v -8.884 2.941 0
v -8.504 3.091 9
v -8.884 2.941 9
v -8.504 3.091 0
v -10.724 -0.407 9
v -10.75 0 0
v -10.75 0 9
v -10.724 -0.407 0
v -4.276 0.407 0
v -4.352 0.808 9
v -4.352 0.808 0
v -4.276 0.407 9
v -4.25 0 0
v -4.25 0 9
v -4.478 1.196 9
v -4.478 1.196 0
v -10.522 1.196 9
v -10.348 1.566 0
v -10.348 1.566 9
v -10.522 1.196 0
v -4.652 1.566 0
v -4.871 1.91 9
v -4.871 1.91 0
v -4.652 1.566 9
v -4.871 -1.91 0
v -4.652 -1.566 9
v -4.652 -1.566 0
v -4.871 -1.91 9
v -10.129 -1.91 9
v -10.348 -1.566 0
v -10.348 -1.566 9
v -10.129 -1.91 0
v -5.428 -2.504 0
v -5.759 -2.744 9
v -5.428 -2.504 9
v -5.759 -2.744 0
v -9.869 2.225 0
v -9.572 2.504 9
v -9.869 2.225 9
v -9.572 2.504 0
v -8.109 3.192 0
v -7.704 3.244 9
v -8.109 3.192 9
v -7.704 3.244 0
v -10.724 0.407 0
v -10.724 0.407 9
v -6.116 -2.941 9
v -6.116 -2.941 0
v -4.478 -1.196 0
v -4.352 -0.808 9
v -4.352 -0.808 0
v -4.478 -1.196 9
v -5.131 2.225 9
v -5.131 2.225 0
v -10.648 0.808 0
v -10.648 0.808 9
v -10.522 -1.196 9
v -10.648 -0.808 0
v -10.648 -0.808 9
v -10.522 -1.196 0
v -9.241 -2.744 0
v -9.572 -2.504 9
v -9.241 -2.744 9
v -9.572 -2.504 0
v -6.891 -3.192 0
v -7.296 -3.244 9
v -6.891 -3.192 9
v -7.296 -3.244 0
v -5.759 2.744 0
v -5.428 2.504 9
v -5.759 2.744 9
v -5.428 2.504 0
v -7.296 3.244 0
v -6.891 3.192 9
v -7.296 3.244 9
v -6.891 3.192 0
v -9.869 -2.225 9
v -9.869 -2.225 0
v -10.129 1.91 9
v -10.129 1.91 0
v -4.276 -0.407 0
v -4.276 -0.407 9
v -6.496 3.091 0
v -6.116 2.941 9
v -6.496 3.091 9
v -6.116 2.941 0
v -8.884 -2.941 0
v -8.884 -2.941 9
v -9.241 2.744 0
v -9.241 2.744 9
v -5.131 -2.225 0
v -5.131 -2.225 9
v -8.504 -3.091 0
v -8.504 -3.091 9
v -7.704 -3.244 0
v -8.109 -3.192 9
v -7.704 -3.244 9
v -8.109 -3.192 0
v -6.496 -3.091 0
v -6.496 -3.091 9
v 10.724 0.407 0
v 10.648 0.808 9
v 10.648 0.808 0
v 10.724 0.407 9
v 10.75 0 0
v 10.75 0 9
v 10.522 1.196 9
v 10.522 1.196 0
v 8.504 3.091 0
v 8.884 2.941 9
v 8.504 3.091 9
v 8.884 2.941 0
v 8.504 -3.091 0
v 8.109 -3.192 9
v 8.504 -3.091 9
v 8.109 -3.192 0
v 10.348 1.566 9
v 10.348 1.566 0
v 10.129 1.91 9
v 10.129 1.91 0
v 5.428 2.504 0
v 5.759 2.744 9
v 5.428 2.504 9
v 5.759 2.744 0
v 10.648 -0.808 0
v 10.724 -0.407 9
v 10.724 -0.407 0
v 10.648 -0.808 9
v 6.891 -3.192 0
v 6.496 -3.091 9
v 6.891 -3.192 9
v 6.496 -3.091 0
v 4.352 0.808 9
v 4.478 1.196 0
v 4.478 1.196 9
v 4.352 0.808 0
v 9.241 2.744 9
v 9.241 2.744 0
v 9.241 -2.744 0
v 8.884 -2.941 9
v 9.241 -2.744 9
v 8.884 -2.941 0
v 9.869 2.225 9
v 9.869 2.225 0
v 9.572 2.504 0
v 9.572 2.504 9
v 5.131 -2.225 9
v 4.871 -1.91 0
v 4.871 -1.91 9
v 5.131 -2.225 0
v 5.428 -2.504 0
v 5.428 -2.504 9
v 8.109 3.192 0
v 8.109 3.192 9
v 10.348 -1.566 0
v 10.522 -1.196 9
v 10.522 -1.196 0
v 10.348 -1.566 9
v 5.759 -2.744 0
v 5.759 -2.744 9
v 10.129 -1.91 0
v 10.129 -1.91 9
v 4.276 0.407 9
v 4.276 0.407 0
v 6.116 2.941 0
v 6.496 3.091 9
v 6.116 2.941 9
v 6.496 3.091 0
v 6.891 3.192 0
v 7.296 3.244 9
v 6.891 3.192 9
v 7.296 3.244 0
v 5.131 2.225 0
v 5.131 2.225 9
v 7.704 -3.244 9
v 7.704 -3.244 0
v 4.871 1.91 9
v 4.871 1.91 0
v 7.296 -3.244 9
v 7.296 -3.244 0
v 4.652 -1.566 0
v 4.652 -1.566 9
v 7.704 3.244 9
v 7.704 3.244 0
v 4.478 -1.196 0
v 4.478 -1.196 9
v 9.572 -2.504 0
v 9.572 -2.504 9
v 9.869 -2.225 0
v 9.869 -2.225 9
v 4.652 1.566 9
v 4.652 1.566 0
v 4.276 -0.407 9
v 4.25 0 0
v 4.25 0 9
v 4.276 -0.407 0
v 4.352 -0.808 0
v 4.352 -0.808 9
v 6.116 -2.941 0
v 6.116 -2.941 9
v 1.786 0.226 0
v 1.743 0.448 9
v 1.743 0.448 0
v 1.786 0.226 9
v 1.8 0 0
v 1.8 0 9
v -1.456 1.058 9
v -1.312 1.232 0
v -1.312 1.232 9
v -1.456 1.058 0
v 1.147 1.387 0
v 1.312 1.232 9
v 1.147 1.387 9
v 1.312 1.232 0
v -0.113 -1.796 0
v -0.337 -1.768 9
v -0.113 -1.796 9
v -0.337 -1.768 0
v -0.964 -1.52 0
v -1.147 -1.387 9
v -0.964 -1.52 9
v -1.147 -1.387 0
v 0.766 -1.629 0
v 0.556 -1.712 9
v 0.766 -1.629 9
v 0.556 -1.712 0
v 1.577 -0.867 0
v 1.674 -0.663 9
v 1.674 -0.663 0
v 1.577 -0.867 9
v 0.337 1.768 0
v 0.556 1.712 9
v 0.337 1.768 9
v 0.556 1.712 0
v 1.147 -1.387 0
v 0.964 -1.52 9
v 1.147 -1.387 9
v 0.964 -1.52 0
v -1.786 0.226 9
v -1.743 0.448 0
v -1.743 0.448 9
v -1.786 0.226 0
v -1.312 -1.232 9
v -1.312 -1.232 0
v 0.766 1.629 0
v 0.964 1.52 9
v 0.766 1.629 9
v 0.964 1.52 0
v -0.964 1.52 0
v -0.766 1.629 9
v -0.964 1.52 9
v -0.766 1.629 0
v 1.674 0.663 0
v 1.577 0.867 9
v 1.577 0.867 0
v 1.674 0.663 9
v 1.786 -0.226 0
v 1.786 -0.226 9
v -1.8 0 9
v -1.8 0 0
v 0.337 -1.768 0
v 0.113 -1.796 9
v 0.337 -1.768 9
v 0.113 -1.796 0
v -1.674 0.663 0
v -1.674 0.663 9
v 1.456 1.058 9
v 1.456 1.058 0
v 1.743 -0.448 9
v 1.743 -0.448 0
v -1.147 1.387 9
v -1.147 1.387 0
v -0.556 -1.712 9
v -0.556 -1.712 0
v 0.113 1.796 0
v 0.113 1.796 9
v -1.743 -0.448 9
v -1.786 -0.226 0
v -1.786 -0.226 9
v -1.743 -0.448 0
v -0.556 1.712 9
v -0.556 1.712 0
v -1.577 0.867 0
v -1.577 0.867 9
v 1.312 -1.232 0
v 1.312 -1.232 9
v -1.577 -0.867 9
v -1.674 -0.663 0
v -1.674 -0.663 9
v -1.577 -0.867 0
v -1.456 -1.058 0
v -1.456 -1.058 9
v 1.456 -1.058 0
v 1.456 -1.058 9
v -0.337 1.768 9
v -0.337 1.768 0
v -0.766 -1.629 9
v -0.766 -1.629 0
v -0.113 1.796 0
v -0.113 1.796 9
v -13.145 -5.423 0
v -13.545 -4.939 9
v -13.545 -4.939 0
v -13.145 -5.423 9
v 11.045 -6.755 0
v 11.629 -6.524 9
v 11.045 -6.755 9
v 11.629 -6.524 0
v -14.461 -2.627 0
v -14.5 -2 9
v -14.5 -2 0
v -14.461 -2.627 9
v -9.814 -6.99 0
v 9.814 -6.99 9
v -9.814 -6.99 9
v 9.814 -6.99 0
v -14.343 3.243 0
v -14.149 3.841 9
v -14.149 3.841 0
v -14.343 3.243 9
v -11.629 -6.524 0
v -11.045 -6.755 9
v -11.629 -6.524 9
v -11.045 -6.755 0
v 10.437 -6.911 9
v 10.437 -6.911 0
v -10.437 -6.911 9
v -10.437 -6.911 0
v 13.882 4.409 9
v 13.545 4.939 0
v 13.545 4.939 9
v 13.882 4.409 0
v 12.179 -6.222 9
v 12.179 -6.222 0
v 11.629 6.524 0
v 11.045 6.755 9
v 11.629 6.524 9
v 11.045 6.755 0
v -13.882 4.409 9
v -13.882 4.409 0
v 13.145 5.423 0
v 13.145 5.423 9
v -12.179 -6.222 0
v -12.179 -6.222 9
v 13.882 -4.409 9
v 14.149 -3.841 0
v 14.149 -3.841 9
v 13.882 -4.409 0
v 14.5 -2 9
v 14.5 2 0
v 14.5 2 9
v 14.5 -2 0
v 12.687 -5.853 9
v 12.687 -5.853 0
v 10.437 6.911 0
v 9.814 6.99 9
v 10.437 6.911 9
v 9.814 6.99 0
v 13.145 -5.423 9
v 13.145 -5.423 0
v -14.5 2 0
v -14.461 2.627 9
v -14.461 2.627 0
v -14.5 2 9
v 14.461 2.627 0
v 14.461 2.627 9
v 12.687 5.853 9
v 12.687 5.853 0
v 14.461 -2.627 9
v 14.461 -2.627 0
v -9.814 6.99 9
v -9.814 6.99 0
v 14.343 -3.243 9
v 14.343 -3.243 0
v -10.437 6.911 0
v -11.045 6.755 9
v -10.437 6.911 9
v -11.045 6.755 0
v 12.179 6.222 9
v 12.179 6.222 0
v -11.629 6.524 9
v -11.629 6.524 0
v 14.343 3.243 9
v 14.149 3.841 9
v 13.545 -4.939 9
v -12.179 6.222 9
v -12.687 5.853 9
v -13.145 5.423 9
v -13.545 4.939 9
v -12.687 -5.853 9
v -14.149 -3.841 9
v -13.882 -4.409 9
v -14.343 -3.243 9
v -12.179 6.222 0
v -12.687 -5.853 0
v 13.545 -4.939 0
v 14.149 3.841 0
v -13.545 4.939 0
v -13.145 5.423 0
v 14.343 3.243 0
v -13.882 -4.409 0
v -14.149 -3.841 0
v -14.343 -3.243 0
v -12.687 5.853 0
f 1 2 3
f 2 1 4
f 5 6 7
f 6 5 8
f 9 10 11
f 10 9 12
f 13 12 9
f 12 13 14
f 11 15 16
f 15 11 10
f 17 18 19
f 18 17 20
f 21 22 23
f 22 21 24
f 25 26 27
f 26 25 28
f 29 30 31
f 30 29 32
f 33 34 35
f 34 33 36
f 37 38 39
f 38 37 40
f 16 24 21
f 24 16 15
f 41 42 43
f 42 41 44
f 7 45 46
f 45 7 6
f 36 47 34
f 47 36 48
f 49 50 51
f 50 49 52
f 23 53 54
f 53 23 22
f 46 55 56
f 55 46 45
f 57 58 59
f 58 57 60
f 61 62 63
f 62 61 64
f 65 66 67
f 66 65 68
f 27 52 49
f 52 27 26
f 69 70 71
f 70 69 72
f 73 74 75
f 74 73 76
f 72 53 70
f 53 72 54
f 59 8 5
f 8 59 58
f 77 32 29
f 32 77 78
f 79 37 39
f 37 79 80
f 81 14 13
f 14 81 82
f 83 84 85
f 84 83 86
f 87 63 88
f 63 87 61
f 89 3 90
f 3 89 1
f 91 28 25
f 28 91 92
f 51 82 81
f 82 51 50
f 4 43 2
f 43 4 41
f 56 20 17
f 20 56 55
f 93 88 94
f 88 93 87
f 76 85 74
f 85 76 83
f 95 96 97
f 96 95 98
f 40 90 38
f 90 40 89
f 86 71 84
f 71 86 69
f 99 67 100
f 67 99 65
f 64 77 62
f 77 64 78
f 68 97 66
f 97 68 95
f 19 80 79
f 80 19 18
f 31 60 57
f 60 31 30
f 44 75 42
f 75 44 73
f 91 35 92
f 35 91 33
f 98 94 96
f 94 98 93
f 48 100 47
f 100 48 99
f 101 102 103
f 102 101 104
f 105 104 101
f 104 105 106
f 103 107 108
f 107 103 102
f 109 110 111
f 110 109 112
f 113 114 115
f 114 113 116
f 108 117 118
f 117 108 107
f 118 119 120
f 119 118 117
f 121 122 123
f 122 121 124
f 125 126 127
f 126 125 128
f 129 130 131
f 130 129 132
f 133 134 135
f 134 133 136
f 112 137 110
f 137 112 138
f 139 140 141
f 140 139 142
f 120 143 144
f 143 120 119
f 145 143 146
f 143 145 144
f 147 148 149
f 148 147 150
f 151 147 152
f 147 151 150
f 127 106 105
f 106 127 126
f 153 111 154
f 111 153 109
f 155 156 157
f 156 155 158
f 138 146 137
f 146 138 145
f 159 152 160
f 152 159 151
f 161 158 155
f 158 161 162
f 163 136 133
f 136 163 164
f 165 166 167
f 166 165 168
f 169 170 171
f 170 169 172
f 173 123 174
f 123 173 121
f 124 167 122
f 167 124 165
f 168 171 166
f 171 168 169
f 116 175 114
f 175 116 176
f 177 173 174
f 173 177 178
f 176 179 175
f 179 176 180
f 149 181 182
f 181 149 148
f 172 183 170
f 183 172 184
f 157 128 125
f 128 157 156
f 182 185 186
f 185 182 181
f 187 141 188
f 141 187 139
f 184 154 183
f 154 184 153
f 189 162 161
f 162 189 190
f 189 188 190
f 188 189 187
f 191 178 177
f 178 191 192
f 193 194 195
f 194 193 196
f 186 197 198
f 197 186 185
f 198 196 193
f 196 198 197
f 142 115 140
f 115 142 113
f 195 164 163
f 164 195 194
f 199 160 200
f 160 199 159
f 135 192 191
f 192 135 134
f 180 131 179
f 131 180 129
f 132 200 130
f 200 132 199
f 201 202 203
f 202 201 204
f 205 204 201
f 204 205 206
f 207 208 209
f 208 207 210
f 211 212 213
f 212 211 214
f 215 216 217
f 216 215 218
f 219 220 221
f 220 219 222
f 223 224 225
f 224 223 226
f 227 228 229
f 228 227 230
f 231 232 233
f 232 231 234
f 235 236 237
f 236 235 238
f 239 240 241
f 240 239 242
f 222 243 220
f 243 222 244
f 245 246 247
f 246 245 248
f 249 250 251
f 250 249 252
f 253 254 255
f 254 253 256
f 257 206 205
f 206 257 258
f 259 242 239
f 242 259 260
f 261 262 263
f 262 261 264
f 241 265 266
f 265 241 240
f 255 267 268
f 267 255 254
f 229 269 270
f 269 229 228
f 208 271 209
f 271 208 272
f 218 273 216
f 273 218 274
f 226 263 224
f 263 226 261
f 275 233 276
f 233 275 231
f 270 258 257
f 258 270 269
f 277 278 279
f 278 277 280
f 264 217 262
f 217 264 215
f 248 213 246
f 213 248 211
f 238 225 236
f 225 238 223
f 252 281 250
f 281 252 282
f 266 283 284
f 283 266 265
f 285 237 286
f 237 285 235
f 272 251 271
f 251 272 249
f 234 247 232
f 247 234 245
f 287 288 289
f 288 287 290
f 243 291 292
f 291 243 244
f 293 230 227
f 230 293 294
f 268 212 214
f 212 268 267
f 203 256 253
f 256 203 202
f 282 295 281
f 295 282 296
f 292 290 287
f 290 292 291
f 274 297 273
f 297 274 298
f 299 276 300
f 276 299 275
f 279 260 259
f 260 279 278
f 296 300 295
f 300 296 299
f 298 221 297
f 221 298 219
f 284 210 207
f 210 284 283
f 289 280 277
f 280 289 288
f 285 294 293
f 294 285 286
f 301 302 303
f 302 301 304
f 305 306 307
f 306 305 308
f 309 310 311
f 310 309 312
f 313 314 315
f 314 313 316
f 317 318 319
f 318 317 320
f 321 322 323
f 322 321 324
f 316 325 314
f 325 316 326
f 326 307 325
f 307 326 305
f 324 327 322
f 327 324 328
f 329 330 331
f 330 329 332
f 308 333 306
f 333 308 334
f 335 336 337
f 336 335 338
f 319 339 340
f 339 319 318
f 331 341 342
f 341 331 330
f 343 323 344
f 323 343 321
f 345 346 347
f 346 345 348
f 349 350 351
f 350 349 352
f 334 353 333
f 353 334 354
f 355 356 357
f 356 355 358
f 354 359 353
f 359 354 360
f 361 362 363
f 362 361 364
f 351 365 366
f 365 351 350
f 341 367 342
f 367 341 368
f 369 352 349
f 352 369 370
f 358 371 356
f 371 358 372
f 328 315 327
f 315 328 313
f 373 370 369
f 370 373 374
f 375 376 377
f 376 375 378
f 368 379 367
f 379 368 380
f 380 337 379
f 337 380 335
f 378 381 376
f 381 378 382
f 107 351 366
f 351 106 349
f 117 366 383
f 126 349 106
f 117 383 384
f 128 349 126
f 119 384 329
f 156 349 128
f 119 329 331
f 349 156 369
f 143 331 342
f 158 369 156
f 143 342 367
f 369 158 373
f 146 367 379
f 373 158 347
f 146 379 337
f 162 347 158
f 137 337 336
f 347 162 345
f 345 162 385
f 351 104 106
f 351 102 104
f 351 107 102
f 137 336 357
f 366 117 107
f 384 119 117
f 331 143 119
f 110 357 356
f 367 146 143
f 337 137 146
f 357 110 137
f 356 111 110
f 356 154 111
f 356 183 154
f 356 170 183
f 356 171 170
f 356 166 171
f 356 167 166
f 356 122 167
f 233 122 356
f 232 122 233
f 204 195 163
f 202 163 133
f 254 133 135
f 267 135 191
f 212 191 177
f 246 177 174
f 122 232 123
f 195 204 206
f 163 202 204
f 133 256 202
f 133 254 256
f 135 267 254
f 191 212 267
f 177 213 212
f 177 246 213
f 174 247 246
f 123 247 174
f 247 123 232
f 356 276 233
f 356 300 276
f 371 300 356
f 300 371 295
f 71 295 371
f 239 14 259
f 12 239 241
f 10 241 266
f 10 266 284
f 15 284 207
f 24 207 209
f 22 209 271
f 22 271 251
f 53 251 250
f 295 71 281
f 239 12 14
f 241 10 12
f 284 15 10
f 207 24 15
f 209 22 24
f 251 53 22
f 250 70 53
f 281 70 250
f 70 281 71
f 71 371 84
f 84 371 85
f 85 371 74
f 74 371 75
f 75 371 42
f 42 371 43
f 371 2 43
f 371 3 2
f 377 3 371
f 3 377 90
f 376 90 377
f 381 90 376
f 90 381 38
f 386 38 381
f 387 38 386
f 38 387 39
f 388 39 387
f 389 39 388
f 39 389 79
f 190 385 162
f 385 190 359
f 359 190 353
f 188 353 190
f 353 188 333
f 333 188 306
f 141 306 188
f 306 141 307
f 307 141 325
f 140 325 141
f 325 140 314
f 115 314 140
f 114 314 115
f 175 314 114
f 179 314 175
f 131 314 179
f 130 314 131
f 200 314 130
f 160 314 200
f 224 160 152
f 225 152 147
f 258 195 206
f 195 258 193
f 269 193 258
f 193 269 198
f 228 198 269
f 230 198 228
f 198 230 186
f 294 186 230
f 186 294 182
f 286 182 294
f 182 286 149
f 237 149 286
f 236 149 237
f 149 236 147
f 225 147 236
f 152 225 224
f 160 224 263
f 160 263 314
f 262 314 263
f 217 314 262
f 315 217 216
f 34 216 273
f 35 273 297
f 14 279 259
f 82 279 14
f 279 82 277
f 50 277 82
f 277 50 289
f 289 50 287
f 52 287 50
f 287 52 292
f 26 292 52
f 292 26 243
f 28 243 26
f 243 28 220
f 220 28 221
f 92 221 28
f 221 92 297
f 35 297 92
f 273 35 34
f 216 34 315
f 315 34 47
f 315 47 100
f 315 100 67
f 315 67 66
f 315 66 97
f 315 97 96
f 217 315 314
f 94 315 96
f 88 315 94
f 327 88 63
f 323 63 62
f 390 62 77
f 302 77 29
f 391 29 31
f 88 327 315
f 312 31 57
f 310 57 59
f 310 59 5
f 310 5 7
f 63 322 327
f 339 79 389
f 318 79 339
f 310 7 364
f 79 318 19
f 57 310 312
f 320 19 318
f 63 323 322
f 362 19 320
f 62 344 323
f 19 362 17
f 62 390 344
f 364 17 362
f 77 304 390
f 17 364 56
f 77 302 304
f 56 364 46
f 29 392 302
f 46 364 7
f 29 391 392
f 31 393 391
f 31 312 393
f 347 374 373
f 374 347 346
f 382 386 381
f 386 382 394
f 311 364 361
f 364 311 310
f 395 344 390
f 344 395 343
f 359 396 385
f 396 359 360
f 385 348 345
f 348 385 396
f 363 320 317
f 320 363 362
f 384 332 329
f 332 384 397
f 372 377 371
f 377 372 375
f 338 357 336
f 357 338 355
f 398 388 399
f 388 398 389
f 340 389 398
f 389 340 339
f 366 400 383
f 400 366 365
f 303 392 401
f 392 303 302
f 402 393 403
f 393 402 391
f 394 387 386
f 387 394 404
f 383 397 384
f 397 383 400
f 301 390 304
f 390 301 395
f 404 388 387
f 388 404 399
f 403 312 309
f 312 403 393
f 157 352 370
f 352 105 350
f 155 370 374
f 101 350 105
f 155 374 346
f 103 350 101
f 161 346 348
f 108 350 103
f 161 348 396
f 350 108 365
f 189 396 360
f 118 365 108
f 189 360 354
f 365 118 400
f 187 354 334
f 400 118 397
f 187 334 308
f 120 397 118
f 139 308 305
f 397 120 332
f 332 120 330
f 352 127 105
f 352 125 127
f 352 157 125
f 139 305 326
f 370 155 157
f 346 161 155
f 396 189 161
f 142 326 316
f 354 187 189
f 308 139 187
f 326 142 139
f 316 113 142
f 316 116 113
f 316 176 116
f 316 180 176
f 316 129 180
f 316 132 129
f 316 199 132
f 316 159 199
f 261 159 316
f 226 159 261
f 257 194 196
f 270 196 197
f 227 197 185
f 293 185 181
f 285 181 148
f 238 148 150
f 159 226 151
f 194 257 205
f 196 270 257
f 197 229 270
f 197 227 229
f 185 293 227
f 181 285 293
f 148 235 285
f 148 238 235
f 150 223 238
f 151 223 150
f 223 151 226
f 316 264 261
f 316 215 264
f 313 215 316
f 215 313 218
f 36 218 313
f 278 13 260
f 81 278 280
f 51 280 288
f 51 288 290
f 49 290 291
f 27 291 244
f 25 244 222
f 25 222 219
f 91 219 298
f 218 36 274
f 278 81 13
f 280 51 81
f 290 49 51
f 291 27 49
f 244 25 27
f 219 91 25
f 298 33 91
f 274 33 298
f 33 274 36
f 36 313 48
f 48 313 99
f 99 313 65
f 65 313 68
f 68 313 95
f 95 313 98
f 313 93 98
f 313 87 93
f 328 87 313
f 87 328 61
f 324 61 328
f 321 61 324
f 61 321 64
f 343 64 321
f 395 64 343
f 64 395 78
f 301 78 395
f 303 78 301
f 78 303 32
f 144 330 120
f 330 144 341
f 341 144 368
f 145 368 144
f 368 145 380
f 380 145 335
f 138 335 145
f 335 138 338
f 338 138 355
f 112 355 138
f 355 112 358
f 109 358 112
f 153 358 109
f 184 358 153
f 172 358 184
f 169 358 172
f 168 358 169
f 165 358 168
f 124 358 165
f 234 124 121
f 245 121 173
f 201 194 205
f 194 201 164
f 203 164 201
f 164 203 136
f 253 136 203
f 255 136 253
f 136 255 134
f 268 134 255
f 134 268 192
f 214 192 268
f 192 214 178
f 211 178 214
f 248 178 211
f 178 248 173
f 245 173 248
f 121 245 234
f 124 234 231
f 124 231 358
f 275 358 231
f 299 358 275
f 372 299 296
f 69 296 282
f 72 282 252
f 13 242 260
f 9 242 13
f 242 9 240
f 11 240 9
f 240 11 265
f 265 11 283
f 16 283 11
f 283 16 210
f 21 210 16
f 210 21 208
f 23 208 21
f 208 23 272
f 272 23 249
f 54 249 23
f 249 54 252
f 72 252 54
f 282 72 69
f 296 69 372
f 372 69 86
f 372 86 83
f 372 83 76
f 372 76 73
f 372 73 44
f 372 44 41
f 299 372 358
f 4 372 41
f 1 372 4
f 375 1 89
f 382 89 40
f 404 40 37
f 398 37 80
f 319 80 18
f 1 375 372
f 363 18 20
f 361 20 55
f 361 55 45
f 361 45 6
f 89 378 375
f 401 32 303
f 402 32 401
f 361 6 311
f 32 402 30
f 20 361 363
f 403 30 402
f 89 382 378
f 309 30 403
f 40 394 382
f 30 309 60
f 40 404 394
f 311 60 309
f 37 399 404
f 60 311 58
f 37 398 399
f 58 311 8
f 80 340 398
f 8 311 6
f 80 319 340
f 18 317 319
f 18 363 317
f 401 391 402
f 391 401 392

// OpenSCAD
$fn = 50;


difference() {
	union() {
		*color(alpha = 1.0000000000, c = "gray") {
			translate(v = [0, 7, 0]) {
				linear_extrude(height = 1) {
					text(font = "Arial:style=Bold", halign = "center", size = 4.5000000000, text = "COMMENT plate main", valign = "center");
				}
			}
		}
		hull() {
			translate(v = [-9.5000000000, 2.0000000000, 0]) {
				cylinder(h = 9, r = 5);
			}
			translate(v = [9.5000000000, 2.0000000000, 0]) {
				cylinder(h = 9, r = 5);
			}
			translate(v = [-9.5000000000, -2.0000000000, 0]) {
				cylinder(h = 9, r = 5);
			}
			translate(v = [9.5000000000, -2.0000000000, 0]) {
				cylinder(h = 9, r = 5);
			}
		}
	}
	union() {
		*color(alpha = 1.0000000000, c = "gray") {
			translate(v = [0, 7, 0]) {
				linear_extrude(height = 1) {
					text(font = "Arial:style=Bold", halign = "center", size = 4.5000000000, text = "COMMENT holes main", valign = "center");
				}
			}
		}
		translate(v = [-7.5000000000, 0.0000000000, 0]) {
			translate(v = [0, 0, -100]) {
				cylinder(h = 200, r = 3.2500000000);
			}
		}
		translate(v = [7.5000000000, 0.0000000000, 0]) {
			translate(v = [0, 0, -100]) {
				cylinder(h = 200, r = 3.2500000000);
			}
		}
		translate(v = [-7.5000000000, 0.0000000000, 0]) {
			translate(v = [0, 0, -100]) {
				cylinder(h = 200, r = 1.8000000000);
			}
		}
		translate(v = [0, 0, -100]) {
			cylinder(h = 200, r = 1.8000000000);
		}
		translate(v = [7.5000000000, 0.0000000000, 0]) {
			translate(v = [0, 0, -100]) {
				cylinder(h = 200, r = 1.8000000000);
			}
		}
	}
}
